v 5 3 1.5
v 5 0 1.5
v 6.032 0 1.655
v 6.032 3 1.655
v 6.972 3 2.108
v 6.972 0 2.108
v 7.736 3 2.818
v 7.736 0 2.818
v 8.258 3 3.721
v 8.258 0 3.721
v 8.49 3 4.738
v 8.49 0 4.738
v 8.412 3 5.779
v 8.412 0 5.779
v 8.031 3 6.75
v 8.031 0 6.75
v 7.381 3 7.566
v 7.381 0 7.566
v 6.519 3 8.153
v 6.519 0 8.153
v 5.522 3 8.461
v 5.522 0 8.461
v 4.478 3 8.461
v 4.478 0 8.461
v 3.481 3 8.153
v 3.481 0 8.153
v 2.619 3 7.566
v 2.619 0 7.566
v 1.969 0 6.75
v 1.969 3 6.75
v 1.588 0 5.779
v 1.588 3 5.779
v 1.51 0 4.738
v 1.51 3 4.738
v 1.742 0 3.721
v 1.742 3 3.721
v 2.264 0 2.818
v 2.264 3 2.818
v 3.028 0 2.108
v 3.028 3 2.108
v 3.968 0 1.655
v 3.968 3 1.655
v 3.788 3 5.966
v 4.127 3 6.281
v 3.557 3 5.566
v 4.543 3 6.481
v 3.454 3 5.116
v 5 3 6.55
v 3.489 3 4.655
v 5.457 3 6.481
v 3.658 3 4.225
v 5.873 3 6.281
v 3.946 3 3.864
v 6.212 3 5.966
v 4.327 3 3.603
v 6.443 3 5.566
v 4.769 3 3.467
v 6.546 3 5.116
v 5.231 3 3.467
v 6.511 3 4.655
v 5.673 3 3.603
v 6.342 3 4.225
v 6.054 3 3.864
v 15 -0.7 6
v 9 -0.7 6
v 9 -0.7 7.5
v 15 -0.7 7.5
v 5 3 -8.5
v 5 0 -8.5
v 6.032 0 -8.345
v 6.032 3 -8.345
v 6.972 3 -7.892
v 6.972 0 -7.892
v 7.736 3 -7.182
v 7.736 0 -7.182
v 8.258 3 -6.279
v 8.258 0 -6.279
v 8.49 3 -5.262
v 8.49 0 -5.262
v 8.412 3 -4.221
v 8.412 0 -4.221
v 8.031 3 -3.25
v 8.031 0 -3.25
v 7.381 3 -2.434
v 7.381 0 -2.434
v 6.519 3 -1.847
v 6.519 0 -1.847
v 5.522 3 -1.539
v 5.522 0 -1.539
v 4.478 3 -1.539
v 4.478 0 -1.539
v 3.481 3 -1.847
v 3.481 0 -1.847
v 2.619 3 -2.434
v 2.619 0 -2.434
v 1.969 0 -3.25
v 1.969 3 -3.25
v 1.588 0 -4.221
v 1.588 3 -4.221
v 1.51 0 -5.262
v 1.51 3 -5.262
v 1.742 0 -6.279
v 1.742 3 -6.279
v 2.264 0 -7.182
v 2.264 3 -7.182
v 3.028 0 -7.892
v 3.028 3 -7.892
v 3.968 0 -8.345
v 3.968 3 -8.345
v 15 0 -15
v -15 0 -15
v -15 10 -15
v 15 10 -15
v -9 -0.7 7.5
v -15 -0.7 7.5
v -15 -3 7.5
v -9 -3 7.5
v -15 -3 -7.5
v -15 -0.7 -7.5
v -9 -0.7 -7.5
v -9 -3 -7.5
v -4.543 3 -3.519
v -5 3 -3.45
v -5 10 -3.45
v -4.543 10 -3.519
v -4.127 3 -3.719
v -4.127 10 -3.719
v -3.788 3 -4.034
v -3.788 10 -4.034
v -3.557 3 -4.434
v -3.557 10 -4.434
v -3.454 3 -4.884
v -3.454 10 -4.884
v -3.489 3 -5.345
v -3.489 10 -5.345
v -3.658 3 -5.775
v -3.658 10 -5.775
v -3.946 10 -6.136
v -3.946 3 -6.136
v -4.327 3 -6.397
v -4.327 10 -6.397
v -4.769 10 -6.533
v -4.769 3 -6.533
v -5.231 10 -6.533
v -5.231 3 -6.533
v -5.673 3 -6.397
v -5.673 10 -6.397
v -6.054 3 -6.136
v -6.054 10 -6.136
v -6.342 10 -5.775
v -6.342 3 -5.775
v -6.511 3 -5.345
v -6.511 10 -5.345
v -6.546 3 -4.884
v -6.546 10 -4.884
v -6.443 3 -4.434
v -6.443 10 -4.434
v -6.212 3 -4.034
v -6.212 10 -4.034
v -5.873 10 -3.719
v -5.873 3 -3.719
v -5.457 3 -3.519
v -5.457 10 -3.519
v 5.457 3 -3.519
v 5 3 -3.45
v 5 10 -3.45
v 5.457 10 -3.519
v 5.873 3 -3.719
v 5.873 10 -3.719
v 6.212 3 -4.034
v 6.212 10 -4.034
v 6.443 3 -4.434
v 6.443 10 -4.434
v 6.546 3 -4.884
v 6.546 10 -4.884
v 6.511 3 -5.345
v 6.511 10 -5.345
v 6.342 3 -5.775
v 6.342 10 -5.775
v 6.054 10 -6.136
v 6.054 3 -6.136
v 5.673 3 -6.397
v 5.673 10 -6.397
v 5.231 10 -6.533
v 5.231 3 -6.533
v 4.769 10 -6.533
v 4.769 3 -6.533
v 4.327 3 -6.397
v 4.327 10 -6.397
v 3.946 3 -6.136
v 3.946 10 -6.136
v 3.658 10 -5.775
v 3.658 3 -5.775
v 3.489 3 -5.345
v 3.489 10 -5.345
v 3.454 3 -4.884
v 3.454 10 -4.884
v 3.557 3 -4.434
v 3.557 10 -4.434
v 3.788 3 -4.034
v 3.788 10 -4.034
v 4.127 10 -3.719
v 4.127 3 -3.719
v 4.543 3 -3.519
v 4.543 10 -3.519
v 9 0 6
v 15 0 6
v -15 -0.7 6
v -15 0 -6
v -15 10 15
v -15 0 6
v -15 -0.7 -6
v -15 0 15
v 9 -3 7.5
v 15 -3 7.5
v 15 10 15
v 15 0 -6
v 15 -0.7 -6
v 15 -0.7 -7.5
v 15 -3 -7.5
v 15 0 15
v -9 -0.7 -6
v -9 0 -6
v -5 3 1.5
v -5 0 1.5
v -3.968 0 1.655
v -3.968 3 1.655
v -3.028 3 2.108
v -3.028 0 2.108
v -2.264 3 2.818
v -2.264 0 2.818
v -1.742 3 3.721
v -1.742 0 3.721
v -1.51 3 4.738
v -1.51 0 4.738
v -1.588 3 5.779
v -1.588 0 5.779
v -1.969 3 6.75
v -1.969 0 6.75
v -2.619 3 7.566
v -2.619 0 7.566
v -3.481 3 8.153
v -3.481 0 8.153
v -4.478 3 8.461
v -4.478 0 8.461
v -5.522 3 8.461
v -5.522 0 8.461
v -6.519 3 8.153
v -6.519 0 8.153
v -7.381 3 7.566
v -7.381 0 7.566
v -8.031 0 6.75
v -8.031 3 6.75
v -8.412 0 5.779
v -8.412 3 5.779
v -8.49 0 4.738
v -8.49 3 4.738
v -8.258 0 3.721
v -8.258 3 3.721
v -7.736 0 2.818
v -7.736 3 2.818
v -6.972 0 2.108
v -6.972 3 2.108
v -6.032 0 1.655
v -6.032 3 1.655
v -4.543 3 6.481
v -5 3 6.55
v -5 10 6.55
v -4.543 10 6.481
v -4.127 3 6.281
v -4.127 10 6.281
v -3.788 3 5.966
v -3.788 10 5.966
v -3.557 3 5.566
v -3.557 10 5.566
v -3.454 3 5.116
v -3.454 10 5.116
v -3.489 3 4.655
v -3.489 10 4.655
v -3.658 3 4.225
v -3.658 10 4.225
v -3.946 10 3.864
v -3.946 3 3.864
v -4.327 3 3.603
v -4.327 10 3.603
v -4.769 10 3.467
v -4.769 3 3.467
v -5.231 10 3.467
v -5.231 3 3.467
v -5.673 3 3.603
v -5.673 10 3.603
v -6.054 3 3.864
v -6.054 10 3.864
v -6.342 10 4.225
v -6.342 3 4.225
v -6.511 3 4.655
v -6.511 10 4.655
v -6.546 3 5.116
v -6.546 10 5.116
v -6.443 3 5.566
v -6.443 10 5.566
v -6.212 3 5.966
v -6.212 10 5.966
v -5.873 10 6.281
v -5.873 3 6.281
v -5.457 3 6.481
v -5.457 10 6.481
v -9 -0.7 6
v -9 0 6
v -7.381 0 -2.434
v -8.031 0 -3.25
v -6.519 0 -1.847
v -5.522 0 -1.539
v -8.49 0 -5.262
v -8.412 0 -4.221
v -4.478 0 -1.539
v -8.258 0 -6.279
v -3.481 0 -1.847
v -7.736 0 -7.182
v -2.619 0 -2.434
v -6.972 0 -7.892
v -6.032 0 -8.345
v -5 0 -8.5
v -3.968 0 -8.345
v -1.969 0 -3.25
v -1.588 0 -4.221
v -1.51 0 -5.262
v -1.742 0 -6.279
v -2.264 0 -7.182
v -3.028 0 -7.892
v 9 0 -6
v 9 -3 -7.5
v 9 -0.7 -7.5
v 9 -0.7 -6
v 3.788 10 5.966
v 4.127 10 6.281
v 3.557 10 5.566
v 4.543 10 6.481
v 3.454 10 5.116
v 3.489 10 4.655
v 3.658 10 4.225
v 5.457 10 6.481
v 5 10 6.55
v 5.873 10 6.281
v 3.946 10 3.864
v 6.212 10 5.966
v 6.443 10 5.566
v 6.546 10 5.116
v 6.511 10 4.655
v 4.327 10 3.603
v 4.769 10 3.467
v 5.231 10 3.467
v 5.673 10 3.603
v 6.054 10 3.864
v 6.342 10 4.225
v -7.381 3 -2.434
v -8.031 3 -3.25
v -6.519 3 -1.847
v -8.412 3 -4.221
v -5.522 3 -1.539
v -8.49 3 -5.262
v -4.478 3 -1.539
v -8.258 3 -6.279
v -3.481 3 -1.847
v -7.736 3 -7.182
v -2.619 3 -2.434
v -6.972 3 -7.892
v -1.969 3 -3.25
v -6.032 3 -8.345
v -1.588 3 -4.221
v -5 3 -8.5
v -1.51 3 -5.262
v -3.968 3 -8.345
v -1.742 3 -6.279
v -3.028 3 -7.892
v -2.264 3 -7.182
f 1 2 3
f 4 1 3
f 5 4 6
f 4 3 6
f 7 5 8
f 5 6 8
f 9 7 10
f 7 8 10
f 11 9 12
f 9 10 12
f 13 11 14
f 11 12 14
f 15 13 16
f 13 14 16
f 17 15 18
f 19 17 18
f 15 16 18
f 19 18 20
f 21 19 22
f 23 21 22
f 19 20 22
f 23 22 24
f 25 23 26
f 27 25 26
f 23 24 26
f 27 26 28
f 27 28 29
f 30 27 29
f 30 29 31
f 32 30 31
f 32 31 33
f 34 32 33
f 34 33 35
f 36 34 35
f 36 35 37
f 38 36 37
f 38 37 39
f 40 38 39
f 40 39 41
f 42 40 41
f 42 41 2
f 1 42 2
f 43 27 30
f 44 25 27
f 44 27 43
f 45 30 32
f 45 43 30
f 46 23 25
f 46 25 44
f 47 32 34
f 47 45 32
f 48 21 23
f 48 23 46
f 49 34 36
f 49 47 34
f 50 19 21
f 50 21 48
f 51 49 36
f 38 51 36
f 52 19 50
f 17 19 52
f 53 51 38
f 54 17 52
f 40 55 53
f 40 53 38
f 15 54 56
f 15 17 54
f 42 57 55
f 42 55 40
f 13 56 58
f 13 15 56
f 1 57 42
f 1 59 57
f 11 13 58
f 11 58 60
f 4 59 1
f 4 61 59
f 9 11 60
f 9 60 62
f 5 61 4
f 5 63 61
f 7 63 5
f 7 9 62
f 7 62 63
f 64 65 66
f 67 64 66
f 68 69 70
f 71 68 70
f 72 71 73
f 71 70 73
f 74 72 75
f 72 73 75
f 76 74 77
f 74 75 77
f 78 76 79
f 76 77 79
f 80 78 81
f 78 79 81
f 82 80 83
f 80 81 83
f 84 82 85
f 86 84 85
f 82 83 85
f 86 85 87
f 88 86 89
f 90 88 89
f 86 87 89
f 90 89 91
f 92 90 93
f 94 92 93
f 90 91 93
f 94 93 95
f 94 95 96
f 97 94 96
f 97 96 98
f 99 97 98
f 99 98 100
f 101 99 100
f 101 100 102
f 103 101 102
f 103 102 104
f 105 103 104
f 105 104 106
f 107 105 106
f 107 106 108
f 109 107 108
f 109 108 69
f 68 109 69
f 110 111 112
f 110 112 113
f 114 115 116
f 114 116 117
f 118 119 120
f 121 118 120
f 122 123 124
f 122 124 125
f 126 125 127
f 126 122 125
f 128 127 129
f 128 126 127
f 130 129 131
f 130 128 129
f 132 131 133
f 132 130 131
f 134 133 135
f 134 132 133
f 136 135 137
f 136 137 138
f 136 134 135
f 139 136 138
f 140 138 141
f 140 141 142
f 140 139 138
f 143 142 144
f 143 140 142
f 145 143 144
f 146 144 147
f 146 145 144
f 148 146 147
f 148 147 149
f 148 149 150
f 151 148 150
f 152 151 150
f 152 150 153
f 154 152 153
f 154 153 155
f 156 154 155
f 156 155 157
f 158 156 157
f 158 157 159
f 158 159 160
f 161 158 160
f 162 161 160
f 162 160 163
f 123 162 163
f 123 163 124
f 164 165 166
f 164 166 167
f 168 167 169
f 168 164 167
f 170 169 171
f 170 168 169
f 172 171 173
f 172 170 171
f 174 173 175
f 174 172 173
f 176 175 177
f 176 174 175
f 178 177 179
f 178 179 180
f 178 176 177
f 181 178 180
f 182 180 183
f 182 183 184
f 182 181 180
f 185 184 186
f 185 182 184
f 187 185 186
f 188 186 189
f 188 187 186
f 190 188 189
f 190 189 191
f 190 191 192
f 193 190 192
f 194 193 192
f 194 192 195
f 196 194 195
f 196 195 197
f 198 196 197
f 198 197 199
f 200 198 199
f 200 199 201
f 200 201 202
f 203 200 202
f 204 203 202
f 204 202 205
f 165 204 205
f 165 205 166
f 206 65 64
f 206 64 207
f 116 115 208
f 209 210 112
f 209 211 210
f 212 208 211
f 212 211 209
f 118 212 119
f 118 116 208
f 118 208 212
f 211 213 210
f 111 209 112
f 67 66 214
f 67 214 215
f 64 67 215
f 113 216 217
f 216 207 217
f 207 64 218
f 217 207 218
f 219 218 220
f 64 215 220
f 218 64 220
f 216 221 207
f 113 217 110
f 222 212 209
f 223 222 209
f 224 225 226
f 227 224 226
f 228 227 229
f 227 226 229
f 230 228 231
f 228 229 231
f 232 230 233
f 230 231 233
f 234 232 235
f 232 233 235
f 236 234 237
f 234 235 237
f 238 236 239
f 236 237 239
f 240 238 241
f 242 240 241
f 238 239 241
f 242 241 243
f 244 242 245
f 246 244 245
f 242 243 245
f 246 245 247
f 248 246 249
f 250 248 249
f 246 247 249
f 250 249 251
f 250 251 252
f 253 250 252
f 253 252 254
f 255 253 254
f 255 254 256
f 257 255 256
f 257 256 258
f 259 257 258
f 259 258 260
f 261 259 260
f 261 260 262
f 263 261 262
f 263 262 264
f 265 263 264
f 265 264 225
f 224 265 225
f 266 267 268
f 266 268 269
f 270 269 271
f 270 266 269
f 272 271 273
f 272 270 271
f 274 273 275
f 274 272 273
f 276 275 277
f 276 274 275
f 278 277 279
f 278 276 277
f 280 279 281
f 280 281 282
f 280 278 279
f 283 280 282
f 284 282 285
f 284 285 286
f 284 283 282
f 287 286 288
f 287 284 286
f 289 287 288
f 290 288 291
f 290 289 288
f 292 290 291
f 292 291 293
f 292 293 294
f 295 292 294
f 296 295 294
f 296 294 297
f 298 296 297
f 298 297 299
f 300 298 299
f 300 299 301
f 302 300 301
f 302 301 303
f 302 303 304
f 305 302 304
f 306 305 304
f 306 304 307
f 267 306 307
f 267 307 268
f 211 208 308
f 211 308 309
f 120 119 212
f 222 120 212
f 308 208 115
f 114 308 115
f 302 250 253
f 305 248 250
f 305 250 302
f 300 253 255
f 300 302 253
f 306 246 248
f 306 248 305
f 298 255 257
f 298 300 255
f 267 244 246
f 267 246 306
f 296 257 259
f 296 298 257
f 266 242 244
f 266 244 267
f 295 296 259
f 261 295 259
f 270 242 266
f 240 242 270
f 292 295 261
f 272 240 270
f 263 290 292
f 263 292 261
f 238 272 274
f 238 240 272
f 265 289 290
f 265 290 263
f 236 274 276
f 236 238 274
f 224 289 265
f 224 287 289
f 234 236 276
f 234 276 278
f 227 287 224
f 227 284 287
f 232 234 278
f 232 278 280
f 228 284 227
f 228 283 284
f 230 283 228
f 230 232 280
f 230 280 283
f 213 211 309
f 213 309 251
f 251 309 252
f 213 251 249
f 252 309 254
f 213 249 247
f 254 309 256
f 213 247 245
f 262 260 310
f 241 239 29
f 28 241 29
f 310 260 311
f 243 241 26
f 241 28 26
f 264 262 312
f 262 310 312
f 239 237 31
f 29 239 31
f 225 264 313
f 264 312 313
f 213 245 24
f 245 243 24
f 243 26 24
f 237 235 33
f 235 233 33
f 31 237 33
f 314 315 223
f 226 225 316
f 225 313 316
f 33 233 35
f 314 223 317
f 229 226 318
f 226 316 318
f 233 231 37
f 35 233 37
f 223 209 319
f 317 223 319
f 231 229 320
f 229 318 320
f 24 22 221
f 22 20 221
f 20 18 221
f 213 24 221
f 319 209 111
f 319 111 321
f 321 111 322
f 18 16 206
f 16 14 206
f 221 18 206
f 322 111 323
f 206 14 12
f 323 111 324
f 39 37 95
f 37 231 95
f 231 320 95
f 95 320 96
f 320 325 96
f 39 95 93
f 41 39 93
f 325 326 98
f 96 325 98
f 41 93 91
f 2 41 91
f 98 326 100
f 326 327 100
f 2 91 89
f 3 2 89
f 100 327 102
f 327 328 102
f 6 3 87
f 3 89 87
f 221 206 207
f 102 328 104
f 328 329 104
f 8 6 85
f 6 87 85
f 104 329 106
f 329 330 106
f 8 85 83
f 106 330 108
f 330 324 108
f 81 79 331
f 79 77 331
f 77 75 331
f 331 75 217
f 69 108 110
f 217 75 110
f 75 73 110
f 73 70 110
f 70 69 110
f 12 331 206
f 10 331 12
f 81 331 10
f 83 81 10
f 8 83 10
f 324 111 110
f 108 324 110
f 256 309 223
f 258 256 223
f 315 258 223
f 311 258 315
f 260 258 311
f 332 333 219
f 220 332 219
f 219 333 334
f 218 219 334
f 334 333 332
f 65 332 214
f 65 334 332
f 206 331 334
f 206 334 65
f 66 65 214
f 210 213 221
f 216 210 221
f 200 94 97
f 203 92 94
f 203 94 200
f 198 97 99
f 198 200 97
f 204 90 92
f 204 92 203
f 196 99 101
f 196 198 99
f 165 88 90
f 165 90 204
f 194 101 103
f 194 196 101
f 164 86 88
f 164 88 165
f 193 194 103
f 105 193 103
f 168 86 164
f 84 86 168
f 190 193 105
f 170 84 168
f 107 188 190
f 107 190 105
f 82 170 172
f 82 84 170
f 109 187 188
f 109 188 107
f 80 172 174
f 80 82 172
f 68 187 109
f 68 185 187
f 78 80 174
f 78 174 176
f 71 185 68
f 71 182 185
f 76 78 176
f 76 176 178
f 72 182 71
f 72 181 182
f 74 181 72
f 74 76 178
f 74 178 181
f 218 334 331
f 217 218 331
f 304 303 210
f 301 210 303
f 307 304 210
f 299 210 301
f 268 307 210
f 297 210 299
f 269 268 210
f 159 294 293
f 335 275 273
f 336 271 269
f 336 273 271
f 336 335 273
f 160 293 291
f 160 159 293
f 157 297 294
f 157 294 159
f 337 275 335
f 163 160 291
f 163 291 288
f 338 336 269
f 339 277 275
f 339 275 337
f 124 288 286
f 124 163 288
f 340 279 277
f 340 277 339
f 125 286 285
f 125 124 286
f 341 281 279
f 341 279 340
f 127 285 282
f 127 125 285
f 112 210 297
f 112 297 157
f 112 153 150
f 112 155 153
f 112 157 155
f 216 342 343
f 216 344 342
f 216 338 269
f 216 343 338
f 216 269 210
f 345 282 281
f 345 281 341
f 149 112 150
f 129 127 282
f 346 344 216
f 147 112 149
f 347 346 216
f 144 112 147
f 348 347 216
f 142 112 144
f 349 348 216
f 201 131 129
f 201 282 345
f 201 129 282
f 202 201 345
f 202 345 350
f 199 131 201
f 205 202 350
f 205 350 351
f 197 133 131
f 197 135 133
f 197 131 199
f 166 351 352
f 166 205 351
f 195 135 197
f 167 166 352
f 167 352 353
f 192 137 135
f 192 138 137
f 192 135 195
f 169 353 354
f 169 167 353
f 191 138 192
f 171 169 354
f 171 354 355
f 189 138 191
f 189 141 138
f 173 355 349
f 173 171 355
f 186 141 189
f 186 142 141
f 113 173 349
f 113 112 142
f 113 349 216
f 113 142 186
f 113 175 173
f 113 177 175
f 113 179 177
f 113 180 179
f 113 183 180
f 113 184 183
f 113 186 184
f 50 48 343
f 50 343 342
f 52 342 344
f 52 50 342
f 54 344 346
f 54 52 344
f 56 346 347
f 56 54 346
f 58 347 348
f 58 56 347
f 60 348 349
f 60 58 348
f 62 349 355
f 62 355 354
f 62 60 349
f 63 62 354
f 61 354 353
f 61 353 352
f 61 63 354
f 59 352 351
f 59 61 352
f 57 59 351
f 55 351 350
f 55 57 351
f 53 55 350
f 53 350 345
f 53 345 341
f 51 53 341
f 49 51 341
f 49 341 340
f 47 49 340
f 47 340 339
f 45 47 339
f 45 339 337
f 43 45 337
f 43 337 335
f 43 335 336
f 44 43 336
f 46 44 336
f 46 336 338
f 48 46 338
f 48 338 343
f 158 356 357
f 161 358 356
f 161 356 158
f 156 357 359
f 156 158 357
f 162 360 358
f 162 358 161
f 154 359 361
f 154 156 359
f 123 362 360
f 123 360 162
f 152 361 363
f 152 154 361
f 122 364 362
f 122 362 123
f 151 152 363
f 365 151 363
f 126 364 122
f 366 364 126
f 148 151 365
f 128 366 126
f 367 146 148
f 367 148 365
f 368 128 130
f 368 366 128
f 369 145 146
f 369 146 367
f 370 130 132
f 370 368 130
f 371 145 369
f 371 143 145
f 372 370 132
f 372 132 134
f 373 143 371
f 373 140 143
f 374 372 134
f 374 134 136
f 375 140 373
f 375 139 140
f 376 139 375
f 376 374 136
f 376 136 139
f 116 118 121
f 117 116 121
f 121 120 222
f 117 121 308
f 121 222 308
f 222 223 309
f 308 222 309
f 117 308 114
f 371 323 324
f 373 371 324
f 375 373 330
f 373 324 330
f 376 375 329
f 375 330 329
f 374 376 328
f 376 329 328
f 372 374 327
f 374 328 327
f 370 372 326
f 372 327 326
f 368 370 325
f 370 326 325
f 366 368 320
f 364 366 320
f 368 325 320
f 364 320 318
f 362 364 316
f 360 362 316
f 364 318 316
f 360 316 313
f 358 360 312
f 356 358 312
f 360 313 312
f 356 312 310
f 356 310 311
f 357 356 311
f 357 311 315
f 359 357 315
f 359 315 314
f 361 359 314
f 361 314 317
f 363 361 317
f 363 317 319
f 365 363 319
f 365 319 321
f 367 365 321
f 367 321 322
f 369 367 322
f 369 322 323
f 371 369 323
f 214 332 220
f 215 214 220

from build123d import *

# Parameters (mm, degrees)
SKETCH_1_W          = 30
SKETCH_1_H          = 30
SKETCH_1_R          = 1.55
EXTRUDE_1_DEPTH     = 10
SKETCH_2_R          = 3.5
CUT_EXTRUDE_1_DEPTH = 3
SKETCH_3_W          = 6
SKETCH_3_H          = 15
EXTRUDE_3_DEPTH     = 3
SKETCH_5_W          = 1.5
SKETCH_5_H          = 0.7
CUT_EXTRUDE_3_DEPTH = 36


with BuildPart() as part:
    # 草图1 → 凸台-拉伸1 (new body)
    with BuildSketch(Plane(origin=(0, 0, 0), x_dir=(1, 0, 0), z_dir=(0, 1, 0))):
        Rectangle(SKETCH_1_W, SKETCH_1_H)
        with Locations(Location((-5, 5, 0), (0, 0, 270))):
            Circle(SKETCH_1_R, mode=Mode.SUBTRACT)
        with Locations(Location((5, 5, 0), (0, 0, 270))):
            Circle(SKETCH_1_R, mode=Mode.SUBTRACT)
        with Locations(Location((5, -5, 0), (0, 0, 270))):
            Circle(SKETCH_1_R, mode=Mode.SUBTRACT)
        with Locations(Location((-5, -5, 0), (0, 0, 270))):
            Circle(SKETCH_1_R, mode=Mode.SUBTRACT)
    extrude(amount=EXTRUDE_1_DEPTH)

    # 草图2 → 切除-拉伸1 (cut)
    with BuildSketch(Plane.XZ):
        with Locations(Location((-5, 5, 0), (0, 0, 270))):
            Circle(SKETCH_2_R)
        with Locations(Location((5, 5, 0), (0, 0, 270))):
            Circle(SKETCH_2_R)
        with Locations(Location((5, -5, 0), (0, 0, 270))):
            Circle(SKETCH_2_R)
        with Locations(Location((-5, -5, 0), (0, 0, 270))):
            Circle(SKETCH_2_R)
    extrude(amount=-CUT_EXTRUDE_1_DEPTH, mode=Mode.SUBTRACT)

    # 草图3 → 凸台-拉伸3 (add)
    with BuildSketch(Plane.XZ):
        with Locations((-12, 0)):
            Rectangle(SKETCH_3_W, SKETCH_3_H)
        with Locations((12, 0)):
            Rectangle(SKETCH_3_W, SKETCH_3_H)
    extrude(amount=EXTRUDE_3_DEPTH)

    # 草图5 → 切除-拉伸3 (cut, through all)
    with BuildSketch(Plane.ZY.offset(15)):
        with Locations((-6.75, -0.35)):
            Rectangle(SKETCH_5_W, SKETCH_5_H)
        with Locations((6.75, -0.35)):
            Rectangle(SKETCH_5_W, SKETCH_5_H)
    extrude(amount=-CUT_EXTRUDE_3_DEPTH, mode=Mode.SUBTRACT)


solid = part.part
